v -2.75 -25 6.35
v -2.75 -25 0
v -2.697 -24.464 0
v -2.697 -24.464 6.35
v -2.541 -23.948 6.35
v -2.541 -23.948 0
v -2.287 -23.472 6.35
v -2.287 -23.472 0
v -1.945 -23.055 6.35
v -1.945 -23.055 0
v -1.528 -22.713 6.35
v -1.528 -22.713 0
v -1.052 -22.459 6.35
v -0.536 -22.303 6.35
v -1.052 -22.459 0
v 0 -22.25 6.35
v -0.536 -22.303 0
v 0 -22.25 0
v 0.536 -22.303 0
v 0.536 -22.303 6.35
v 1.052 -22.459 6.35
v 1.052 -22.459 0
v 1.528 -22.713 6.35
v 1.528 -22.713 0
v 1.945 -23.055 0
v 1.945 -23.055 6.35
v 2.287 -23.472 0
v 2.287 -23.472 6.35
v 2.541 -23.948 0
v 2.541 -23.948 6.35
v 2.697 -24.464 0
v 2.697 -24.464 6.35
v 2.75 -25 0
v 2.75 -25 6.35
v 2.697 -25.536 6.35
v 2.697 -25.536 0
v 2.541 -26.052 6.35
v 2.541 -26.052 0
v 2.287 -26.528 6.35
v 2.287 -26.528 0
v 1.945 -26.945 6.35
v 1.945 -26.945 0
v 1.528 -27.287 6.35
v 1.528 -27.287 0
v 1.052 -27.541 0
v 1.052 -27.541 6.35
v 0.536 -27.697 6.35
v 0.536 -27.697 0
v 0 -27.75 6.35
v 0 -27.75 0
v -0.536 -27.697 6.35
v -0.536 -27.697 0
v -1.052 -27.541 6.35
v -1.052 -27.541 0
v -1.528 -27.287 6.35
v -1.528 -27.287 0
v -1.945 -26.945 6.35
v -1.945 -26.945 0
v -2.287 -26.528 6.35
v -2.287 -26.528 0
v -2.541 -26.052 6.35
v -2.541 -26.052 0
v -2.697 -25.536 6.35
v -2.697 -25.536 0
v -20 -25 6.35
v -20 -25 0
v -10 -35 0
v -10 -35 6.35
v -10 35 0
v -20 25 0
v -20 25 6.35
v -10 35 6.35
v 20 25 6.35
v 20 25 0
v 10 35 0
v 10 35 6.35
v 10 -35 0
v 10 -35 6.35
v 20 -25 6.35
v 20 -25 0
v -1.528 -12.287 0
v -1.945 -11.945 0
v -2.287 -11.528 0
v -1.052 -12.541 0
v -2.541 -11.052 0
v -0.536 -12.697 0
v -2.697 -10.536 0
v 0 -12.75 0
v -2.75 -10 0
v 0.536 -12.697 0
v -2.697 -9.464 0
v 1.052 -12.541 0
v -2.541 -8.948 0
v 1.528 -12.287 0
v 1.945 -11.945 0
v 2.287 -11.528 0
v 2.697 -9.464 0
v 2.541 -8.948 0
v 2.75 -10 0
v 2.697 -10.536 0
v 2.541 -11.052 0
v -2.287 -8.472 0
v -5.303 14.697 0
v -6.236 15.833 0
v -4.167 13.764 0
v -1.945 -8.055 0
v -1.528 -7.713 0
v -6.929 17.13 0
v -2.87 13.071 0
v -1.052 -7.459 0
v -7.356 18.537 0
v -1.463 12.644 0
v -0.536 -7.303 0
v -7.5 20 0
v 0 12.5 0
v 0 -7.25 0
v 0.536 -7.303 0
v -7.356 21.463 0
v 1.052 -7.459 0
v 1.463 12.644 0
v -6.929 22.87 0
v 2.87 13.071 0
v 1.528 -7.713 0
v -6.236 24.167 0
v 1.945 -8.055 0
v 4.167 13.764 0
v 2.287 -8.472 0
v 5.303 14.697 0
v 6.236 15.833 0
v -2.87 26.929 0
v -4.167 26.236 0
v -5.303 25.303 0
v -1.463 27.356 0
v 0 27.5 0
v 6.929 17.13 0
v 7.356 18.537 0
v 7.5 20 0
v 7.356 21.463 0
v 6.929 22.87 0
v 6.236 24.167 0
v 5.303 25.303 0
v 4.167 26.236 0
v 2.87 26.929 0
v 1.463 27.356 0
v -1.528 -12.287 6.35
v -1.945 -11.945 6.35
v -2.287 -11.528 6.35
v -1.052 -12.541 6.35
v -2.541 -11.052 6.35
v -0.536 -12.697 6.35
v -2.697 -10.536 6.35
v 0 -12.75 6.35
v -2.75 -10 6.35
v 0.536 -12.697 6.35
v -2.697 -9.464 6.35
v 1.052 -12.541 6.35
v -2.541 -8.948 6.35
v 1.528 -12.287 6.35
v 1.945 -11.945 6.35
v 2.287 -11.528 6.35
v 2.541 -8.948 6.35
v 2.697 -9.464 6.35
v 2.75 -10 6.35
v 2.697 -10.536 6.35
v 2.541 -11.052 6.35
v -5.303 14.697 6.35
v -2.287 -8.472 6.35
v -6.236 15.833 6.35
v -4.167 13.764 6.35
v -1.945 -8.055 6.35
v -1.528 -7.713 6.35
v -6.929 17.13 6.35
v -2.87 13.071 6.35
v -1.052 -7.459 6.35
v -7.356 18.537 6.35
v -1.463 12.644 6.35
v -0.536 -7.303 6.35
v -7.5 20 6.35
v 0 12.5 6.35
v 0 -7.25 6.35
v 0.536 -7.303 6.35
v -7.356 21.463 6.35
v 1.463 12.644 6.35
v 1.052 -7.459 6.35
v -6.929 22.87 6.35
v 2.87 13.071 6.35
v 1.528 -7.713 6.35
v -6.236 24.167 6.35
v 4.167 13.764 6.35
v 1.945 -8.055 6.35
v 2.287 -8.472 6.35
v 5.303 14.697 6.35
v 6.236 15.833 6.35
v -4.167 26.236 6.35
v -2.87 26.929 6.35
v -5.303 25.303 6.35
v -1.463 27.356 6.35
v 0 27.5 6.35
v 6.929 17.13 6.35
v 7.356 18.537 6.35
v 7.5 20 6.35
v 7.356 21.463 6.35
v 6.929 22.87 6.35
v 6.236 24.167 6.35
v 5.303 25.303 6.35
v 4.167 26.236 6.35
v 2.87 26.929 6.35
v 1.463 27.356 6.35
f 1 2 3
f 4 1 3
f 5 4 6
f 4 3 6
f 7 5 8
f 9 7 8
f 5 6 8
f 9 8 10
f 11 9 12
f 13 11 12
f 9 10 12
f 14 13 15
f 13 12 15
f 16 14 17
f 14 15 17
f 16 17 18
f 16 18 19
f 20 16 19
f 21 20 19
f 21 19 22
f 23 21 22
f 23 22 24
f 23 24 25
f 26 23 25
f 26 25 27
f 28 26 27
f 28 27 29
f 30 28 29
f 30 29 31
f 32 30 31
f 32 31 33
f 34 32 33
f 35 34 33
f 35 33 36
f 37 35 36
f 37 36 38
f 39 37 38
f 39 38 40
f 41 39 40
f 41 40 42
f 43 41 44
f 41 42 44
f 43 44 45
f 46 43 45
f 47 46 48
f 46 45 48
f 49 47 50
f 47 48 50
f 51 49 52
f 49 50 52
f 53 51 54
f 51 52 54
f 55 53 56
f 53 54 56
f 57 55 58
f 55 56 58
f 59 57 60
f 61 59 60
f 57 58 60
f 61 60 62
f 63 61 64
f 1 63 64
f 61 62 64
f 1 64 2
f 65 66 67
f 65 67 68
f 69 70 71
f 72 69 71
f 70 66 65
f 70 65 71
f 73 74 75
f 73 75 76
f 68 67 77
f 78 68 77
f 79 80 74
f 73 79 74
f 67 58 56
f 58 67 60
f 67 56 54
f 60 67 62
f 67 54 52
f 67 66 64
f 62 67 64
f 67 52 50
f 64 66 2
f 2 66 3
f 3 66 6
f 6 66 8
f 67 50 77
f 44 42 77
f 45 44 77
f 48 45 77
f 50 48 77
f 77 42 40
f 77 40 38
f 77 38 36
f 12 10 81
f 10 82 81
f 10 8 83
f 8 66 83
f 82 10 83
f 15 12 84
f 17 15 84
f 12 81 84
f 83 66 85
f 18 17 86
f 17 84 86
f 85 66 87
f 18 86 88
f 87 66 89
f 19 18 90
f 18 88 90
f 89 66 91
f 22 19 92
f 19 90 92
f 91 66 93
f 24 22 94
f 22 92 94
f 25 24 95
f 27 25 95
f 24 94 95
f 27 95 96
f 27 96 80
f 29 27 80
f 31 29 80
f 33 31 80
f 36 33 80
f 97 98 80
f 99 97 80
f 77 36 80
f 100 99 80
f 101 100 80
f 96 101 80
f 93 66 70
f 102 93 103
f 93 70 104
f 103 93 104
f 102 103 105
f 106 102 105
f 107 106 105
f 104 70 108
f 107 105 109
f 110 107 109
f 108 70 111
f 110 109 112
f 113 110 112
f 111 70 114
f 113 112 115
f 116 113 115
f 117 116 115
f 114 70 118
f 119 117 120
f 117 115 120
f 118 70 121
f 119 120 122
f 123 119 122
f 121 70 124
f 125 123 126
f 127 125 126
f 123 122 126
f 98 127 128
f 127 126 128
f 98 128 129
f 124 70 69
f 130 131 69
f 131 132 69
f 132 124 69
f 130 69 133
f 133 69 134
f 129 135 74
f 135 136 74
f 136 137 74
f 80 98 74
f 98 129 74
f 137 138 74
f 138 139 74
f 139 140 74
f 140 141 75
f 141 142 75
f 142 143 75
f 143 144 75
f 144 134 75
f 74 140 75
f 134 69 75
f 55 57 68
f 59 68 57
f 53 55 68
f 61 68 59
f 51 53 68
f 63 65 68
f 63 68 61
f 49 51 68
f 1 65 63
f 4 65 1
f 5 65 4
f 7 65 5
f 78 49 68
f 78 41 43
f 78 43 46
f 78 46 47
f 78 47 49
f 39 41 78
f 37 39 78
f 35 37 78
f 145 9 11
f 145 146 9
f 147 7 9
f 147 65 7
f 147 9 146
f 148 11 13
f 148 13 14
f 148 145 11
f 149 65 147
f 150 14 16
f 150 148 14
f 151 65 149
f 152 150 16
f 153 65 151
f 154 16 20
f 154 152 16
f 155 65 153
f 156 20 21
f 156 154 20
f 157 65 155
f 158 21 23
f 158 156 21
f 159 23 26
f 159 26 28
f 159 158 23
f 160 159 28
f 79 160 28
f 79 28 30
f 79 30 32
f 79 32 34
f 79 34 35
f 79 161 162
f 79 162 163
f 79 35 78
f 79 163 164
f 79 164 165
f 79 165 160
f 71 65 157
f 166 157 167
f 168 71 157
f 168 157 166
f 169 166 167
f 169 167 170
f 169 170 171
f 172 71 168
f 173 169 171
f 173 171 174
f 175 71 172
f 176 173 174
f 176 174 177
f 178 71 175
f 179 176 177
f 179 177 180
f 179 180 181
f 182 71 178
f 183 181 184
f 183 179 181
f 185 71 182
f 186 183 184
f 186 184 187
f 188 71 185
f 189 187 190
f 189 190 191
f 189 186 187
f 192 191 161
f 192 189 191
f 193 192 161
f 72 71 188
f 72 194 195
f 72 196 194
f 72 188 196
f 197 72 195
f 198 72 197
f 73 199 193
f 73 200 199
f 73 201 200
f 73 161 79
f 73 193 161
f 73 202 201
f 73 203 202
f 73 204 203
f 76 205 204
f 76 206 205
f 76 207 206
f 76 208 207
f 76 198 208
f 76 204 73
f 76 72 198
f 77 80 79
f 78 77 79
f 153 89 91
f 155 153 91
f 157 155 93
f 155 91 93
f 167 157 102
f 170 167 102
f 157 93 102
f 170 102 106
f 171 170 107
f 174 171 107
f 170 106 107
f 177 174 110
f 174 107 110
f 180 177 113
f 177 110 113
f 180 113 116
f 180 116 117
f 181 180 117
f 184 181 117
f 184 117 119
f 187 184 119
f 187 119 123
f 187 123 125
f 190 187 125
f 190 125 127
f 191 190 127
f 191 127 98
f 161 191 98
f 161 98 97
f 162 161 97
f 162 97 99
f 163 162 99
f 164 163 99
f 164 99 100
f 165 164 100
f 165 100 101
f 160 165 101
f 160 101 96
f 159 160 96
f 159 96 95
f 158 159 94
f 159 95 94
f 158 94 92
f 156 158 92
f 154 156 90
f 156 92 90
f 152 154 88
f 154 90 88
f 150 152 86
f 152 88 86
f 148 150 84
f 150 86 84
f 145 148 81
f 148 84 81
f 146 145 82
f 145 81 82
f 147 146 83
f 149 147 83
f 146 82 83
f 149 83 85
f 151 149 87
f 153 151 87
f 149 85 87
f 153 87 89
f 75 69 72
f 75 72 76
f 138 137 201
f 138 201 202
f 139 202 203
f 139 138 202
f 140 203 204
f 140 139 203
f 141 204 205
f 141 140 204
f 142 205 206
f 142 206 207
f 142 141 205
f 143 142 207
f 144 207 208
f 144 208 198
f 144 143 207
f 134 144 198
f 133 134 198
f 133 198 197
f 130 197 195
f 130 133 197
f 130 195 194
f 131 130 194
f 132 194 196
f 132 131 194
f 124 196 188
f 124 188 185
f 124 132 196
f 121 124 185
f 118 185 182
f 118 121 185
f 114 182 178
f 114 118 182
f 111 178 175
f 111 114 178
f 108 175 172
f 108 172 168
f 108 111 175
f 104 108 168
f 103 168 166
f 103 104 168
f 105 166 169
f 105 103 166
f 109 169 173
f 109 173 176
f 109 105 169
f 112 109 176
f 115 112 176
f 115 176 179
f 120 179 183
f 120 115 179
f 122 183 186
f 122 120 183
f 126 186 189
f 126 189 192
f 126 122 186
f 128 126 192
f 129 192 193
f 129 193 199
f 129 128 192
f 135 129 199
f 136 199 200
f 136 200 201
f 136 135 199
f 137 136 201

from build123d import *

# Parameters (mm, degrees)
SKETCH1_W            = 40
SKETCH1_H            = 70
SKETCH1_R            = 7.5
BOSS_EXTRUDE1_DEPTH  = 6.35
M5_CLEARANCE_HOLE1_D = 5.5
CHAMFER1_SIZE        = 10


with BuildPart() as part:
    # Sketch1 → Boss-Extrude1 (new body)
    with BuildSketch(Plane.XY):
        Rectangle(SKETCH1_W, SKETCH1_H)
        with Locations((0, 20)):
            Circle(SKETCH1_R, mode=Mode.SUBTRACT)
    extrude(amount=BOSS_EXTRUDE1_DEPTH)

    # M5 Clearance Hole1 (through all)
    with Locations(Plane.XY.offset(6.35)):
        with Locations((0, -10), (0, -25)):
            Hole(M5_CLEARANCE_HOLE1_D / 2)

    # Chamfer1
    chamfer1_edges = [part.edges().sort_by_distance(p)[0] for p in [
        (-20, 35, 3.175),
        (20, 35, 3.175),
        (20, -35, 3.175),
        (-20, -35, 3.175),
    ]]
    chamfer(chamfer1_edges, length=CHAMFER1_SIZE)


solid = part.part
